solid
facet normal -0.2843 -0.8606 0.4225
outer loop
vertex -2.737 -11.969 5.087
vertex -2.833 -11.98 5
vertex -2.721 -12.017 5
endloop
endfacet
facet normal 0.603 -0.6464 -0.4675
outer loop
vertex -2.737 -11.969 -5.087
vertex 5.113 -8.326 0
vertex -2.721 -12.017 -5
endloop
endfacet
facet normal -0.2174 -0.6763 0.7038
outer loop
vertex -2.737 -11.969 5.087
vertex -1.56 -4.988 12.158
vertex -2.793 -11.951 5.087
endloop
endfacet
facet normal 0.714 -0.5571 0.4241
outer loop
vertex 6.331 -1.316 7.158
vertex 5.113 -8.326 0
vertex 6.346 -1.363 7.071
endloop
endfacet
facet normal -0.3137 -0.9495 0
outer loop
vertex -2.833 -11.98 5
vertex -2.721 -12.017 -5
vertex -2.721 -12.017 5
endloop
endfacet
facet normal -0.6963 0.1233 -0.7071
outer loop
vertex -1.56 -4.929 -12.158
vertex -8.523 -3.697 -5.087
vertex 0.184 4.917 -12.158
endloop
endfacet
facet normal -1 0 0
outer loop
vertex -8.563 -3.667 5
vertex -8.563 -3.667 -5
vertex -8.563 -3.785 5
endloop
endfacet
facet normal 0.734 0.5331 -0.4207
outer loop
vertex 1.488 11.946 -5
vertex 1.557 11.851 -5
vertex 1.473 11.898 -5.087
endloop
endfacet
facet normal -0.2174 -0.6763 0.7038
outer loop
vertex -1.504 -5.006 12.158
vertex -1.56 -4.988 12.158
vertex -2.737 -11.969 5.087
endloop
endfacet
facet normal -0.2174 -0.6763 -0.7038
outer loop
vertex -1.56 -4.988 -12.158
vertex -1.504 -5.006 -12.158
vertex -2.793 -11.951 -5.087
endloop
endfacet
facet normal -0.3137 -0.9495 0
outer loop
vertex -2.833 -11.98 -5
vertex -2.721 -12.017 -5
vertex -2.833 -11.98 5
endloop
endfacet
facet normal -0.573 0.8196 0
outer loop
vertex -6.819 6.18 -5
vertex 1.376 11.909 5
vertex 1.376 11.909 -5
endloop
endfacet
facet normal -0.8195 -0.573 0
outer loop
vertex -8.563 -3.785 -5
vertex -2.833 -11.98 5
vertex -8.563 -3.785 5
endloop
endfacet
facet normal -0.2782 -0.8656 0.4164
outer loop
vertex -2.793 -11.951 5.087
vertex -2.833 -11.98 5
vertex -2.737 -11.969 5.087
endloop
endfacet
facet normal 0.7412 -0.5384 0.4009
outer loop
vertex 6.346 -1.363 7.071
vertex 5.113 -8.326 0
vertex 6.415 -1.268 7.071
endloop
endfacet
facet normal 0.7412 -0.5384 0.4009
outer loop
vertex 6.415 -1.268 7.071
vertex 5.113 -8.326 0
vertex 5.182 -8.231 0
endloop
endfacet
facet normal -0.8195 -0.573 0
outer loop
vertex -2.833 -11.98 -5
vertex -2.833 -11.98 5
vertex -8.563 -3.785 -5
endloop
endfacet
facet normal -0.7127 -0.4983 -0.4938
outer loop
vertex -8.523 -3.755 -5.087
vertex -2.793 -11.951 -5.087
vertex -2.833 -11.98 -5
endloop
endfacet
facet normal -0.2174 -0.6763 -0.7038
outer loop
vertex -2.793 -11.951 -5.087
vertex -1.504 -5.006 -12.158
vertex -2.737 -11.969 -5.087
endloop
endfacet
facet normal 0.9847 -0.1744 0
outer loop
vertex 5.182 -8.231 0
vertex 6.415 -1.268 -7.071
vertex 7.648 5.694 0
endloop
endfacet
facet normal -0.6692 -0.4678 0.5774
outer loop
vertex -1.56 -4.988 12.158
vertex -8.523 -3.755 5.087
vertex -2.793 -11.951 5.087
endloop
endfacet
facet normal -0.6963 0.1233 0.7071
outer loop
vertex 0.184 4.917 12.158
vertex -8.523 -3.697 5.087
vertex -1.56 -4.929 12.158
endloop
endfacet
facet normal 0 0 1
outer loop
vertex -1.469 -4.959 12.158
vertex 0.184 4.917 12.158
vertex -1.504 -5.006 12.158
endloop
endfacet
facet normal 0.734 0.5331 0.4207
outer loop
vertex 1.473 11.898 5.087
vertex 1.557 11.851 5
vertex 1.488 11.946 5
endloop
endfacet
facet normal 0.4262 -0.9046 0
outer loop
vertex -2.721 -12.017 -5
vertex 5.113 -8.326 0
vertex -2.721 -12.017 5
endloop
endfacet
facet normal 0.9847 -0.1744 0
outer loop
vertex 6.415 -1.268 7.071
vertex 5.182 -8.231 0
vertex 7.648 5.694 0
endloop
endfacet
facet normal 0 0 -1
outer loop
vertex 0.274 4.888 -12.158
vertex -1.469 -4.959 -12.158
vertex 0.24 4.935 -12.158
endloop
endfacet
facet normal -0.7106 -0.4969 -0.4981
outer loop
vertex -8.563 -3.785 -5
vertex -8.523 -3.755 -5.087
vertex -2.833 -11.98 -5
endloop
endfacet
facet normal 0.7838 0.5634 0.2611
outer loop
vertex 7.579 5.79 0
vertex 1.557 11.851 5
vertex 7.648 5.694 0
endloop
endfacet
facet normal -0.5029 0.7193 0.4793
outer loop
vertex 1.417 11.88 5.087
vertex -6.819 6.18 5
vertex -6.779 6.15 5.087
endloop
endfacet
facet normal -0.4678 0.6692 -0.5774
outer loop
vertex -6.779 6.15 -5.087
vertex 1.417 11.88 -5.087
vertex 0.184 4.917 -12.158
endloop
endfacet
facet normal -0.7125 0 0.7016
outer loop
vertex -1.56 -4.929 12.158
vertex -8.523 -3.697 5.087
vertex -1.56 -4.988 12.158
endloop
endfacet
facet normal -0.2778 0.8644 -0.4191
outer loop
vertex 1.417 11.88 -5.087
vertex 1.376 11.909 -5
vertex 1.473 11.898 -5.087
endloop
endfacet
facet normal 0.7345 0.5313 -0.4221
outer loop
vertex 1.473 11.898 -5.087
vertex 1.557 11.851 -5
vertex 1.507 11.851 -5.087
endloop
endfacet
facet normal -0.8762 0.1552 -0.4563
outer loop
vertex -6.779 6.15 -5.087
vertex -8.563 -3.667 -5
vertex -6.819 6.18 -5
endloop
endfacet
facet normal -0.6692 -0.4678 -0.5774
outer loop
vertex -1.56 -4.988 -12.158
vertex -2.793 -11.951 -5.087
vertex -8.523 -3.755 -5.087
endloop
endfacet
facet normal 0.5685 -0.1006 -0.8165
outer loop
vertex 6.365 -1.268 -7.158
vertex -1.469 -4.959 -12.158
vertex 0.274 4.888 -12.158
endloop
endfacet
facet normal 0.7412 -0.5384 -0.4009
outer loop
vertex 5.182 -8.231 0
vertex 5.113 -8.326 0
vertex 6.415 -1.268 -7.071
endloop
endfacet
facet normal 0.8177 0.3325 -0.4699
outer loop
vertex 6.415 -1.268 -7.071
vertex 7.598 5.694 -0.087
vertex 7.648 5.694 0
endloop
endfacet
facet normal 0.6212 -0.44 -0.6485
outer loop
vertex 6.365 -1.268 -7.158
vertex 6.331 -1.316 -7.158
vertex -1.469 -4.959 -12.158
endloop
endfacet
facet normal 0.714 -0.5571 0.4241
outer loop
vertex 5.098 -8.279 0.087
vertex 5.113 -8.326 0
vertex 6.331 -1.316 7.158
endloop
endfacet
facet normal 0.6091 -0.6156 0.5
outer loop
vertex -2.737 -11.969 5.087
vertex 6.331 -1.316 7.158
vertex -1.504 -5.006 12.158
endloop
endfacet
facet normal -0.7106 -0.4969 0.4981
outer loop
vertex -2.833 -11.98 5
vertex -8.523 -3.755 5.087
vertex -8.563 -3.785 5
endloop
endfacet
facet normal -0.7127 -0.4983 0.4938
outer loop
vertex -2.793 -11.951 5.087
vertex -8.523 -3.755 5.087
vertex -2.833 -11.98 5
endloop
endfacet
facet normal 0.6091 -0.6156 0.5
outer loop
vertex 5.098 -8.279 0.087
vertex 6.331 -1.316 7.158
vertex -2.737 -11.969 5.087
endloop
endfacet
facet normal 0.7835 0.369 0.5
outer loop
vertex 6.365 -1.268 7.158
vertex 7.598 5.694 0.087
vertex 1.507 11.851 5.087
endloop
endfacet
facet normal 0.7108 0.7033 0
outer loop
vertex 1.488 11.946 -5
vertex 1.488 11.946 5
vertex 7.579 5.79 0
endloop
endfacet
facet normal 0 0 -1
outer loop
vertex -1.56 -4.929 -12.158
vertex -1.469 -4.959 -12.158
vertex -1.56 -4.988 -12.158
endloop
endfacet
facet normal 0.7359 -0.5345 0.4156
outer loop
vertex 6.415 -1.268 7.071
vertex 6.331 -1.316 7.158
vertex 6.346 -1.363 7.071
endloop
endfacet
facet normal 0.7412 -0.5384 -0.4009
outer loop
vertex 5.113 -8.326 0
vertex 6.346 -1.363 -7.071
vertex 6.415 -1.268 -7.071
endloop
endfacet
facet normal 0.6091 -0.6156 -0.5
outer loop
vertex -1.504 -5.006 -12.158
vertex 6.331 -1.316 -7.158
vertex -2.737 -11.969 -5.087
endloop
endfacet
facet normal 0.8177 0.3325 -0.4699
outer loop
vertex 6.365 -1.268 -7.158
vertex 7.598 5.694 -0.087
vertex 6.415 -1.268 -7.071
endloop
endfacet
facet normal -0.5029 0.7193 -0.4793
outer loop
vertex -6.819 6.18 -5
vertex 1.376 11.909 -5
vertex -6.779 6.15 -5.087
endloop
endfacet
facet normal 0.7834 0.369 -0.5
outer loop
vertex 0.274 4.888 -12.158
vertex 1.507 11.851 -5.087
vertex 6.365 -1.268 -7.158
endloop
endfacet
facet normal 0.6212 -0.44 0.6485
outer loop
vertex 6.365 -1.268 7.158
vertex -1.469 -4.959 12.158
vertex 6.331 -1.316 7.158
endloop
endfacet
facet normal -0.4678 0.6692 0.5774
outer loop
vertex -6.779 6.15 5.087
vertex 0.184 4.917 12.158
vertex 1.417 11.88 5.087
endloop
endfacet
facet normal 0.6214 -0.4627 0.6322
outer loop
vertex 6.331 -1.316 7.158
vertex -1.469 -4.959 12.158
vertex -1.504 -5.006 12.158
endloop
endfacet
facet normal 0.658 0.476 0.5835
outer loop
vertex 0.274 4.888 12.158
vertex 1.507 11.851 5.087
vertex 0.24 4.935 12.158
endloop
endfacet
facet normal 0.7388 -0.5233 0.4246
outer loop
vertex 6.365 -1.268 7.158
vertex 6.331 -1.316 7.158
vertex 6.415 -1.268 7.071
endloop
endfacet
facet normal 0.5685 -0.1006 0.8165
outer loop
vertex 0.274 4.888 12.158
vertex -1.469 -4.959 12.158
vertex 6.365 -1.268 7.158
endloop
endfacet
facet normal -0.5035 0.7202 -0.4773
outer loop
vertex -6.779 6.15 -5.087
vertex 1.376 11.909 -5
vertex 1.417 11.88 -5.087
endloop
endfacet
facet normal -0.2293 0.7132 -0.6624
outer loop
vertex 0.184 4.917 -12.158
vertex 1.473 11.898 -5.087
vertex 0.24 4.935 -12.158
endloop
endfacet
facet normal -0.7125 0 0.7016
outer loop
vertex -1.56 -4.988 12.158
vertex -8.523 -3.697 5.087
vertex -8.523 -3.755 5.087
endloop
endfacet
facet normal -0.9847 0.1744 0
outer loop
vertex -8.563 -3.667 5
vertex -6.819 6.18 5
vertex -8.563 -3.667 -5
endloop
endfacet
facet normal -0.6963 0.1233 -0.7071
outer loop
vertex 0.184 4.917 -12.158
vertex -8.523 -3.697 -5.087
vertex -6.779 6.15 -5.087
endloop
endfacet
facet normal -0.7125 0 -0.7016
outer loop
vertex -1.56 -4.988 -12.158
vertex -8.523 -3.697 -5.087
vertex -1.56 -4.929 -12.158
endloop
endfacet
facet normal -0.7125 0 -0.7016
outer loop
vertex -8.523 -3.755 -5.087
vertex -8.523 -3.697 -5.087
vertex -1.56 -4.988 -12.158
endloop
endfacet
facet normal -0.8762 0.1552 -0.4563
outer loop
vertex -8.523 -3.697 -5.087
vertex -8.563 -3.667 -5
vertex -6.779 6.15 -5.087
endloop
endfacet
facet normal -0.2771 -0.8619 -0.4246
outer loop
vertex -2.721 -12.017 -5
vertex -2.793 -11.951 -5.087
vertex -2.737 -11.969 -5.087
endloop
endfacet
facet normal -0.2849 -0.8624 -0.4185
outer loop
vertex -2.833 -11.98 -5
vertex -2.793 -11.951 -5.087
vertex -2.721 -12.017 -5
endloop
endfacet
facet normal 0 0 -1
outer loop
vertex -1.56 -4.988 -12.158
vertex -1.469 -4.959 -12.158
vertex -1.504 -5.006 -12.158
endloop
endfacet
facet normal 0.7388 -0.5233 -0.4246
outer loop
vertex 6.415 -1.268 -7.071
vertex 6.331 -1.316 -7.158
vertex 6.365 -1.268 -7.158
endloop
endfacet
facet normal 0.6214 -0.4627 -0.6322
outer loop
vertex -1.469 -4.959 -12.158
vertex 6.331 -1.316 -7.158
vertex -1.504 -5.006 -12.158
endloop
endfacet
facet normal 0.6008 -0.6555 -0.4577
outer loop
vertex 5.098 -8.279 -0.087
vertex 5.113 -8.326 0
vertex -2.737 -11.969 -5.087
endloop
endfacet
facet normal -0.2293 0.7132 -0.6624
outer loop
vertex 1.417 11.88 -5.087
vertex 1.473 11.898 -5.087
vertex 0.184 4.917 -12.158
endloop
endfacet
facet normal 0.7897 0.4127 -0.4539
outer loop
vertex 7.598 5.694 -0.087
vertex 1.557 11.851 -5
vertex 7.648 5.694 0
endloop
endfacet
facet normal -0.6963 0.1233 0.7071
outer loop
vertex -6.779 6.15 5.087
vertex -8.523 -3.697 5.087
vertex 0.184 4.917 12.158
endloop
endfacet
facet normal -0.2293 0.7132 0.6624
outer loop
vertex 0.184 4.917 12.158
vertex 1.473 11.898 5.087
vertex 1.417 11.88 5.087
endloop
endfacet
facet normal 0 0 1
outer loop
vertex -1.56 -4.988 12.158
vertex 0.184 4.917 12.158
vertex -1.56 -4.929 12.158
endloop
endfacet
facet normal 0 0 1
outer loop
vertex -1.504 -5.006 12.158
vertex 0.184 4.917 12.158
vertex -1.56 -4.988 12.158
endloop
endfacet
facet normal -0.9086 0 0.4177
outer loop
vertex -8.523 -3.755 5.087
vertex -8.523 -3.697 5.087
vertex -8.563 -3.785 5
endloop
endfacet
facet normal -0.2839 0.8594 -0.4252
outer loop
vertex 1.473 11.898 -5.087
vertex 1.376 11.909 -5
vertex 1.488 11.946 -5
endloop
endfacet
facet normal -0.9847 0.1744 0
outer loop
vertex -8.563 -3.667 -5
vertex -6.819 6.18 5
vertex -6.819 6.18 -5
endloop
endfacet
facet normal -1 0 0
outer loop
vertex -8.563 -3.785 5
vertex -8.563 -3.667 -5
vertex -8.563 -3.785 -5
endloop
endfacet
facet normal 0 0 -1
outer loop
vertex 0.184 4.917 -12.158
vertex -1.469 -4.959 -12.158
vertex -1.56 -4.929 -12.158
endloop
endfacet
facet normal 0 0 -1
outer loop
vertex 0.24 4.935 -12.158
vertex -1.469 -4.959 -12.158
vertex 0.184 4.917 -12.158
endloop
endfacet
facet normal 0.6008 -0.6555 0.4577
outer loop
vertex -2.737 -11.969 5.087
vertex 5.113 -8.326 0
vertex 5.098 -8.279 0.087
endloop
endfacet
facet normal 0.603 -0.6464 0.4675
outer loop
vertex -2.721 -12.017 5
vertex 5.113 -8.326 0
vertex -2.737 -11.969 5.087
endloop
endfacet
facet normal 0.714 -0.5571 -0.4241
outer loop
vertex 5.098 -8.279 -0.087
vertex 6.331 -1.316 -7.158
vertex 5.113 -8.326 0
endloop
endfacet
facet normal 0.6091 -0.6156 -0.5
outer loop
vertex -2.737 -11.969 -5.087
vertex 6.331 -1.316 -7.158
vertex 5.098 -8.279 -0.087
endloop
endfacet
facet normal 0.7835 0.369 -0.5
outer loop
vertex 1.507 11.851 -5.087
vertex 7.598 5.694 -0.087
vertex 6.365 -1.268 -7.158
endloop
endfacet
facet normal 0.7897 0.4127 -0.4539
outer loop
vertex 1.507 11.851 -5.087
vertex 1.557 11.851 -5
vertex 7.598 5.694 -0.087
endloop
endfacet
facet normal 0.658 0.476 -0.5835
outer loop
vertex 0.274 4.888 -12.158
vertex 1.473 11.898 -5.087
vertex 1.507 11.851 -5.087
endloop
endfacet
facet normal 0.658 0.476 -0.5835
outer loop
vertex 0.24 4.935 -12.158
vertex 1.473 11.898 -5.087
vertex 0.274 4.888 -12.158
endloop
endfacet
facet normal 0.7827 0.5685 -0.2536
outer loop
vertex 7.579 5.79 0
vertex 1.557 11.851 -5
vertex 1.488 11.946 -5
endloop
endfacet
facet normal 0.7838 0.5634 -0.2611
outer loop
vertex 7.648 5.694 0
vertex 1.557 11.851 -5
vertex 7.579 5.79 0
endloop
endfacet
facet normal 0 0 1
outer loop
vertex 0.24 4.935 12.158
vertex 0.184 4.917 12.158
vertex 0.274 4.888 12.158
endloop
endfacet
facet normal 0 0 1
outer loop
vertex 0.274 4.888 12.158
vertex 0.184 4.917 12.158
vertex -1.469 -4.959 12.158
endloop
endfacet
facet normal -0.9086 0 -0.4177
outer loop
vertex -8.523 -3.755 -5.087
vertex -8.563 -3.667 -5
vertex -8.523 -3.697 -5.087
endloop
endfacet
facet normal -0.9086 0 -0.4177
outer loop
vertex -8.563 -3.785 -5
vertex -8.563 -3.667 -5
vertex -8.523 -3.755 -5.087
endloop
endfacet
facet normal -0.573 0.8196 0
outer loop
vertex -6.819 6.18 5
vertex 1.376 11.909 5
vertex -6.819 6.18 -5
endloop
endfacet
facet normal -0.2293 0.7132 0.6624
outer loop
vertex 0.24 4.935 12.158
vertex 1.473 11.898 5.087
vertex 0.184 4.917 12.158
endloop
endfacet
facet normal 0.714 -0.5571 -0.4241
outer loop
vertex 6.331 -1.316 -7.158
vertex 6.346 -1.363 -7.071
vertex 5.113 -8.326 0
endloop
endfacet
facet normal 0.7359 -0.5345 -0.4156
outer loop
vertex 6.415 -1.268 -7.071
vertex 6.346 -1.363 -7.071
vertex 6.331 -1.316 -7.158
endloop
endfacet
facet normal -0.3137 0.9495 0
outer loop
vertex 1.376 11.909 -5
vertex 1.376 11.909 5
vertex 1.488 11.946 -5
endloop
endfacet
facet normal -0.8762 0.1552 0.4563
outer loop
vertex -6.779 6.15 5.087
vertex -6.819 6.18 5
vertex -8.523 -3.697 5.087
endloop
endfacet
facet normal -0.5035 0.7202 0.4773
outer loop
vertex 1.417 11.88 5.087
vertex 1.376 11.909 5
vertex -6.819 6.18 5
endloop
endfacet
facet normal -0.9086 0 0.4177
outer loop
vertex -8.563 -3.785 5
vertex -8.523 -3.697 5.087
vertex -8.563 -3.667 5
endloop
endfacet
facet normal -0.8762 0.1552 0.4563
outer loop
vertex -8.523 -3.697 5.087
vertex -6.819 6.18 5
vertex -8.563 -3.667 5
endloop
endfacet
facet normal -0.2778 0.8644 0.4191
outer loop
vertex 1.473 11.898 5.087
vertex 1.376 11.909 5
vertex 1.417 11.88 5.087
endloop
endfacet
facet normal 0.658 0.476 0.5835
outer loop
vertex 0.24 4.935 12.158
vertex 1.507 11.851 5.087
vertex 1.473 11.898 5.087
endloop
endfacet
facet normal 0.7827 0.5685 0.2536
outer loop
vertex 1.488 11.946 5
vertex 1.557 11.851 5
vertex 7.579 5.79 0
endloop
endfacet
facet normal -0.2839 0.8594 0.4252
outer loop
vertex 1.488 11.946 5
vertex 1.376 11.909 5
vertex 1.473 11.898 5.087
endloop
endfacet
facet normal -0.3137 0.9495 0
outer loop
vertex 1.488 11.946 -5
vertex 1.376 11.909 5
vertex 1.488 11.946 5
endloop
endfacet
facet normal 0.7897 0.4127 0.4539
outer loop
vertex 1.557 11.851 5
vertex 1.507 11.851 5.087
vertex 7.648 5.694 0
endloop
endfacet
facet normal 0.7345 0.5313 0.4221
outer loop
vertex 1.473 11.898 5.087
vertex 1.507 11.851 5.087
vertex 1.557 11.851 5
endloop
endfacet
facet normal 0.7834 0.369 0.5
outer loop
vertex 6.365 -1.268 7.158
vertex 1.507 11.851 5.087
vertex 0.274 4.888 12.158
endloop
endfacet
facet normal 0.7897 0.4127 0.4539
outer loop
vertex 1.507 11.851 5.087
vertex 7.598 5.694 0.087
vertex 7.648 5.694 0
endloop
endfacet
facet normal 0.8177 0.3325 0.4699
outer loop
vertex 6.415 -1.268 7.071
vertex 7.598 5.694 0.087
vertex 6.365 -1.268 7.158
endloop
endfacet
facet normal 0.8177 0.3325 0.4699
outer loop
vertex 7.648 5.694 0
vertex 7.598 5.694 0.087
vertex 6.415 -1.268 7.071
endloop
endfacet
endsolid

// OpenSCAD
// Auto-generated OpenSCAD file

    inner_points = 10*[[-0.1519325222677969, -0.49588870782043115, 1.2071067811865481], [-0.2752191363280171, -1.1921648102349602, 0.5000000000000018], [0.14570769345513235, 1.185070501785053, -0.5000000000000018], [0.02242107939491221, 0.4887943993705236, -1.2071067811865481], [0.02242107939513263, 0.4887943993704884, 1.2071067811865466], [-0.2752191363281084, -1.1921648102349456, -0.499999999999998], [0.14570769345522366, 1.1850705017850383, 0.499999999999998], [-0.15193252226801734, -0.49588870782039596, -1.2071067811865466], [-0.848208624682401, -0.37260209376026526, 0.5000000000000662], [-0.6738550230195627, 0.612081013430669, -0.4999999999999354], [-0.6738550230194714, 0.6120810134306545, 0.5000000000000646], [-0.8482086246824923, -0.3726020937602507, -0.49999999999993383], [0.6315203809781617, -0.12683376828511966, 0.7071067811864822], [0.5082337669179414, -0.8231098706996488, -6.428191312579656e-14], [0.7548069950382528, 0.56944233412943, -6.644684802381562e-14], [0.6315203809780325, -0.1268337682850991, -0.7071067811866129]];

    outer_points = 10*[[-0.007761474101058263, 0.2518537970485801, 1.282035961125326], [-0.8193543823962504, -0.2518537970485801, 0.9860704042545944], [0.8193543823962504, 0.2518537970485801, -0.9860704042545944], [0.007761474101058263, -0.2518537970485801, -1.282035961125326], [0.8083780004585261, 0.608028852569843, 0.8270022394188679], [-1.1509806058735501, -0.608028852569843, 0.11247817802624172], [1.1509806058735501, 0.608028852569843, -0.11247817802624172], [-0.8083780004585261, -0.608028852569843, -0.8270022394188679], [-0.5768761153857935, 0.6108513156443435, 0.54228647196198], [-0.09236286430350876, 0.6108513156443435, -0.786339475972831], [0.23926335917379102, 0.9670263711656064, 0.08725275025552175], [-0.9085023388630934, 0.25467626012308053, -0.3313057542663727], [0.5691146412847352, -0.3589975185957634, 0.7397494891633462], [-0.24247826701045683, -0.8627051126929235, 0.44378393229261437], [0.9117172466997592, -0.3589975185957634, -0.19973092828176342], [0.10012433840456708, -0.8627051126929235, -0.4956964851524952]];

    // Convex hull for inner set (I)
    module inner_hull() {
        hull() {
            for (p = inner_points) {
                translate(p) sphere(r=0.1);
            }
        }
    }

    // Convex hull for outer set (O) minus inner hull (O \ I)
    module outer_minus_inner() {
        difference() {
            hull() {
                for (p = outer_points) {
                    translate(p) sphere(r=0.1);
                }
            }
            inner_hull(); // Subtract inner hull
        }
    }

    // Convex hull for outer set (O) minus all translated inner hulls
    module outer_minus_AllTranslationInner() {
        difference() {
            hull() {
                for (p = outer_points) {
                    translate(p) sphere(r=0.1);
                }
            }
            hull() {
                translate([0,0,50]) inner_hull();
                translate([0,0,-50]) inner_hull();
            }; // Subtract translated inner hulls
        }
    }

    // Difference between outer_minus_inner and outer_minus_AllTranslationInner
    module outer_minus_inner_diff() {
        difference() {
            // Outer minus inner
            difference() {
                hull() {
                    for (p = outer_points) {
                        translate(p) sphere(r=0.1);
                    }
                }
                inner_hull();
            }

            // Subtract Outer minus AllTranslationInner
            difference() {
                hull() {
                    for (p = outer_points) {
                        translate(p) sphere(r=0.1);
                    }
                }
                hull() {
                    translate([0,0,50]) inner_hull();
                    translate([0,0,-50]) inner_hull();
                };
            }
        }
    }

    // Rendering all with colors applied
    color([1, 0, 0, 0.5]) inner_hull(); // Transparent red
    
